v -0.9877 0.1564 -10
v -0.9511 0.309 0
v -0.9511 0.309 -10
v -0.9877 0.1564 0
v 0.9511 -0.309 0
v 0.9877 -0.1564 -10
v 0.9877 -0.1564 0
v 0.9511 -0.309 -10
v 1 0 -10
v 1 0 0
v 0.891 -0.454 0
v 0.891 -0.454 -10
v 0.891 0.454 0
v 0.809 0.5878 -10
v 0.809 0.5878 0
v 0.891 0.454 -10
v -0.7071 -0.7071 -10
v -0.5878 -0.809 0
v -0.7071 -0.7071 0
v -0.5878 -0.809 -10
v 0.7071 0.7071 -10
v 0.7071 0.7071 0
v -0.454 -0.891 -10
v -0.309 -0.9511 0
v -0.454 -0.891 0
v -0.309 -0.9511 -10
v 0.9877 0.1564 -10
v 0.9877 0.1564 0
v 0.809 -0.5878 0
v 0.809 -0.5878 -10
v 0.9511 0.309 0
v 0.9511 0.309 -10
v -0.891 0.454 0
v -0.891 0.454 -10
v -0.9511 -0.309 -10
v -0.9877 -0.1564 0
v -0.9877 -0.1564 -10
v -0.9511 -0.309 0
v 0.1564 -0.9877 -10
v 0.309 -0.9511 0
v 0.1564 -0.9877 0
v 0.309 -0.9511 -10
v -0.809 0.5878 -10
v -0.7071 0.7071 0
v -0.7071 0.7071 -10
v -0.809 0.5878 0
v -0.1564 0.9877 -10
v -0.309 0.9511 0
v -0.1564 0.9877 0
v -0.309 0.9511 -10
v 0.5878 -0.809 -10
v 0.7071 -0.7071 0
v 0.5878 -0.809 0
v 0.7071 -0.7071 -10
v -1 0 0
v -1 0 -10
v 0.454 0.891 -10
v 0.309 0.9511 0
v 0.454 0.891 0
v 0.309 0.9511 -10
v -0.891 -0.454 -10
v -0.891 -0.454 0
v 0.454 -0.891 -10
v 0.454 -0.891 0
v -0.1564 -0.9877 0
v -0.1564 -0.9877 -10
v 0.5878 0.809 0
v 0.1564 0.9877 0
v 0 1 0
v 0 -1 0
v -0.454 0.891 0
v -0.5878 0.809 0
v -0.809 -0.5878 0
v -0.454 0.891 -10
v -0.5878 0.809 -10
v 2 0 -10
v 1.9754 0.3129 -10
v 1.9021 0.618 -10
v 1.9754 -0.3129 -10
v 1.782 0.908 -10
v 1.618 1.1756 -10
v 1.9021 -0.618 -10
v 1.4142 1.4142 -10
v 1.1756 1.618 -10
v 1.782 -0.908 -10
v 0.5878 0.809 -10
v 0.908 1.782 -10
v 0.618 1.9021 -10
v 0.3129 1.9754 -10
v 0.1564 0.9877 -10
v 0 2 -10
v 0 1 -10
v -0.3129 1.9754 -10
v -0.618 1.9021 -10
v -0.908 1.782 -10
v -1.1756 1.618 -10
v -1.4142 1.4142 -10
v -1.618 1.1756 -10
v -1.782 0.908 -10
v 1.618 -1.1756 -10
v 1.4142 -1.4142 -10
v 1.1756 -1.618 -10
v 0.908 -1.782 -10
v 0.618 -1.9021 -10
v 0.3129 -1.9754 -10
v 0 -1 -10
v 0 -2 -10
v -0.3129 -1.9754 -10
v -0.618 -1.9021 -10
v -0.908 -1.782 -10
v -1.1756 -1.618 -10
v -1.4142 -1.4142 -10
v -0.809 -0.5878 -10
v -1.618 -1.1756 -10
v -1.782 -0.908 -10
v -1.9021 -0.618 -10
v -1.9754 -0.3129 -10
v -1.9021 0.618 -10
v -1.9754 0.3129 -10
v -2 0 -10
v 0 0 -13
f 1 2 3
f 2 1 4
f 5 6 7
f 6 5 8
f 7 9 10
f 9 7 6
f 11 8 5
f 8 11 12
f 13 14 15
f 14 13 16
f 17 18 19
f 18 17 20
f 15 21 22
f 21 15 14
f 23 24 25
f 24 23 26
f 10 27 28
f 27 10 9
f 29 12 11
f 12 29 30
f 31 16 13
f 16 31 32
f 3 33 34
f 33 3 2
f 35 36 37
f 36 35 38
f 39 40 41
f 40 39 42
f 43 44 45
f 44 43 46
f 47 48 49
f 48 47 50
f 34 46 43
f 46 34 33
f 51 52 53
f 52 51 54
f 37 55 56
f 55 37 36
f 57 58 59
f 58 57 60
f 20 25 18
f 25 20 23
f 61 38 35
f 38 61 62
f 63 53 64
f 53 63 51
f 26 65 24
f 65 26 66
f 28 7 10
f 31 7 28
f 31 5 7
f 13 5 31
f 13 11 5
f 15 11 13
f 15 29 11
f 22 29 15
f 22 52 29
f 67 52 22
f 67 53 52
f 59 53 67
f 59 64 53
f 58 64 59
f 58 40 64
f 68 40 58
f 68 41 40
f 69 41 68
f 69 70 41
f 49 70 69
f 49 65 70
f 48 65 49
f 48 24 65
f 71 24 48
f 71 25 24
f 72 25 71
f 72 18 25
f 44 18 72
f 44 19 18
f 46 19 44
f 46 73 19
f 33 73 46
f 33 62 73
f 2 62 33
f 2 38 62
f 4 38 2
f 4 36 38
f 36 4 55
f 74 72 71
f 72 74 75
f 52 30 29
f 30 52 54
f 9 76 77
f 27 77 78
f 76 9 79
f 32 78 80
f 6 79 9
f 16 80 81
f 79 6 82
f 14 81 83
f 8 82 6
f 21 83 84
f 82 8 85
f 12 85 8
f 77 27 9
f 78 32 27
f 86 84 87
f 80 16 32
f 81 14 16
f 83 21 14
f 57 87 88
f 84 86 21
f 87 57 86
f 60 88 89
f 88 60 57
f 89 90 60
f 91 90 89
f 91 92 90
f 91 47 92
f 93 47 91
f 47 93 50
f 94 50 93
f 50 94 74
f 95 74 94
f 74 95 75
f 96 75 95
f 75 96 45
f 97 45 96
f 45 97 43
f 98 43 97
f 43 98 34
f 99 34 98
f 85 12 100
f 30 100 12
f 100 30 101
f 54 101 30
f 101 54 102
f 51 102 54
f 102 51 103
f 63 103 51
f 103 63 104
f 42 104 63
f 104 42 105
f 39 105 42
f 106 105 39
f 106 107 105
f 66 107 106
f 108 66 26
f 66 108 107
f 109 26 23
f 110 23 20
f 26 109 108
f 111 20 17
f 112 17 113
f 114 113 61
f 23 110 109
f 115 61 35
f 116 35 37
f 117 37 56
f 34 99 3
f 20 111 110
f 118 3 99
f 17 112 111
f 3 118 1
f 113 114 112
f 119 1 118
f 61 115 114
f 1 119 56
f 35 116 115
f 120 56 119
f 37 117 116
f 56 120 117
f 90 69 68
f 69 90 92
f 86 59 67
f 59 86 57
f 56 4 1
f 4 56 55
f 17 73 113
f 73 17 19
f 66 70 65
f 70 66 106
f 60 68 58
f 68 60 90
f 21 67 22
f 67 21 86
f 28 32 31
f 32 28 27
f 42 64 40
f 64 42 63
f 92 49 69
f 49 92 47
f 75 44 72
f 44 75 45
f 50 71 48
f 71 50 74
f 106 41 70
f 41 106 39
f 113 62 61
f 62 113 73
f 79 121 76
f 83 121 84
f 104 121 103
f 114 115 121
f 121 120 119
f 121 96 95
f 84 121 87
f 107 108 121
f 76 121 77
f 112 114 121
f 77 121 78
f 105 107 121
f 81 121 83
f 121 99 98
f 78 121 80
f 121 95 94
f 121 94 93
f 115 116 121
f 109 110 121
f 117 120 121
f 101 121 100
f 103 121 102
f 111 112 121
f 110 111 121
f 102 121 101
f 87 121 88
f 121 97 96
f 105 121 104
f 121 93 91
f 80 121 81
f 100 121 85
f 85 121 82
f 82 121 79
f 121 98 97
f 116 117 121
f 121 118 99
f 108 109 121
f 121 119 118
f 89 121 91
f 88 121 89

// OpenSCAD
// Start: lazy_union
default_5_default_5();
// End: lazy_union

// Modules.

// 'PartMaterial undef-default - undef-default'
module default_5_default_5() {
  // 'None : _combine_solids_and_holes'
  union() {
    // 'x'
    color(c=[0.1, 1.0, 0.0, 1.0]) {
      // 'x : _combine_solids_and_holes'
      union() {
        // 'stem'
        multmatrix(m=[[1.0, 0.0, 0.0, 0.0], [-0.0, -1.0, -0.0, -0.0], [-0.0, -0.0, -1.0, -0.0], [0.0, 0.0, 0.0, 1.0]]) {
          // 'stem : _combine_solids_and_holes'
          union() {
            // 'stem'
            cylinder(h=10.0, r1=1.0, r2=1.0, center=false, $fn=40);
          }
        }
        // 'head'
        multmatrix(m=[[1.0, 0.0, 0.0, 0.0], [0.0, -1.0, 0.0, 0.0], [0.0, 0.0, -1.0, -10.0], [0.0, 0.0, 0.0, 1.0]]) {
          // 'head : _combine_solids_and_holes'
          union() {
            // 'head'
            cylinder(h=3.0, r1=2.0, r2=0.0, center=false, $fn=40);
          }
        }
      }
    }
  }
} // end module default_5_default_5
